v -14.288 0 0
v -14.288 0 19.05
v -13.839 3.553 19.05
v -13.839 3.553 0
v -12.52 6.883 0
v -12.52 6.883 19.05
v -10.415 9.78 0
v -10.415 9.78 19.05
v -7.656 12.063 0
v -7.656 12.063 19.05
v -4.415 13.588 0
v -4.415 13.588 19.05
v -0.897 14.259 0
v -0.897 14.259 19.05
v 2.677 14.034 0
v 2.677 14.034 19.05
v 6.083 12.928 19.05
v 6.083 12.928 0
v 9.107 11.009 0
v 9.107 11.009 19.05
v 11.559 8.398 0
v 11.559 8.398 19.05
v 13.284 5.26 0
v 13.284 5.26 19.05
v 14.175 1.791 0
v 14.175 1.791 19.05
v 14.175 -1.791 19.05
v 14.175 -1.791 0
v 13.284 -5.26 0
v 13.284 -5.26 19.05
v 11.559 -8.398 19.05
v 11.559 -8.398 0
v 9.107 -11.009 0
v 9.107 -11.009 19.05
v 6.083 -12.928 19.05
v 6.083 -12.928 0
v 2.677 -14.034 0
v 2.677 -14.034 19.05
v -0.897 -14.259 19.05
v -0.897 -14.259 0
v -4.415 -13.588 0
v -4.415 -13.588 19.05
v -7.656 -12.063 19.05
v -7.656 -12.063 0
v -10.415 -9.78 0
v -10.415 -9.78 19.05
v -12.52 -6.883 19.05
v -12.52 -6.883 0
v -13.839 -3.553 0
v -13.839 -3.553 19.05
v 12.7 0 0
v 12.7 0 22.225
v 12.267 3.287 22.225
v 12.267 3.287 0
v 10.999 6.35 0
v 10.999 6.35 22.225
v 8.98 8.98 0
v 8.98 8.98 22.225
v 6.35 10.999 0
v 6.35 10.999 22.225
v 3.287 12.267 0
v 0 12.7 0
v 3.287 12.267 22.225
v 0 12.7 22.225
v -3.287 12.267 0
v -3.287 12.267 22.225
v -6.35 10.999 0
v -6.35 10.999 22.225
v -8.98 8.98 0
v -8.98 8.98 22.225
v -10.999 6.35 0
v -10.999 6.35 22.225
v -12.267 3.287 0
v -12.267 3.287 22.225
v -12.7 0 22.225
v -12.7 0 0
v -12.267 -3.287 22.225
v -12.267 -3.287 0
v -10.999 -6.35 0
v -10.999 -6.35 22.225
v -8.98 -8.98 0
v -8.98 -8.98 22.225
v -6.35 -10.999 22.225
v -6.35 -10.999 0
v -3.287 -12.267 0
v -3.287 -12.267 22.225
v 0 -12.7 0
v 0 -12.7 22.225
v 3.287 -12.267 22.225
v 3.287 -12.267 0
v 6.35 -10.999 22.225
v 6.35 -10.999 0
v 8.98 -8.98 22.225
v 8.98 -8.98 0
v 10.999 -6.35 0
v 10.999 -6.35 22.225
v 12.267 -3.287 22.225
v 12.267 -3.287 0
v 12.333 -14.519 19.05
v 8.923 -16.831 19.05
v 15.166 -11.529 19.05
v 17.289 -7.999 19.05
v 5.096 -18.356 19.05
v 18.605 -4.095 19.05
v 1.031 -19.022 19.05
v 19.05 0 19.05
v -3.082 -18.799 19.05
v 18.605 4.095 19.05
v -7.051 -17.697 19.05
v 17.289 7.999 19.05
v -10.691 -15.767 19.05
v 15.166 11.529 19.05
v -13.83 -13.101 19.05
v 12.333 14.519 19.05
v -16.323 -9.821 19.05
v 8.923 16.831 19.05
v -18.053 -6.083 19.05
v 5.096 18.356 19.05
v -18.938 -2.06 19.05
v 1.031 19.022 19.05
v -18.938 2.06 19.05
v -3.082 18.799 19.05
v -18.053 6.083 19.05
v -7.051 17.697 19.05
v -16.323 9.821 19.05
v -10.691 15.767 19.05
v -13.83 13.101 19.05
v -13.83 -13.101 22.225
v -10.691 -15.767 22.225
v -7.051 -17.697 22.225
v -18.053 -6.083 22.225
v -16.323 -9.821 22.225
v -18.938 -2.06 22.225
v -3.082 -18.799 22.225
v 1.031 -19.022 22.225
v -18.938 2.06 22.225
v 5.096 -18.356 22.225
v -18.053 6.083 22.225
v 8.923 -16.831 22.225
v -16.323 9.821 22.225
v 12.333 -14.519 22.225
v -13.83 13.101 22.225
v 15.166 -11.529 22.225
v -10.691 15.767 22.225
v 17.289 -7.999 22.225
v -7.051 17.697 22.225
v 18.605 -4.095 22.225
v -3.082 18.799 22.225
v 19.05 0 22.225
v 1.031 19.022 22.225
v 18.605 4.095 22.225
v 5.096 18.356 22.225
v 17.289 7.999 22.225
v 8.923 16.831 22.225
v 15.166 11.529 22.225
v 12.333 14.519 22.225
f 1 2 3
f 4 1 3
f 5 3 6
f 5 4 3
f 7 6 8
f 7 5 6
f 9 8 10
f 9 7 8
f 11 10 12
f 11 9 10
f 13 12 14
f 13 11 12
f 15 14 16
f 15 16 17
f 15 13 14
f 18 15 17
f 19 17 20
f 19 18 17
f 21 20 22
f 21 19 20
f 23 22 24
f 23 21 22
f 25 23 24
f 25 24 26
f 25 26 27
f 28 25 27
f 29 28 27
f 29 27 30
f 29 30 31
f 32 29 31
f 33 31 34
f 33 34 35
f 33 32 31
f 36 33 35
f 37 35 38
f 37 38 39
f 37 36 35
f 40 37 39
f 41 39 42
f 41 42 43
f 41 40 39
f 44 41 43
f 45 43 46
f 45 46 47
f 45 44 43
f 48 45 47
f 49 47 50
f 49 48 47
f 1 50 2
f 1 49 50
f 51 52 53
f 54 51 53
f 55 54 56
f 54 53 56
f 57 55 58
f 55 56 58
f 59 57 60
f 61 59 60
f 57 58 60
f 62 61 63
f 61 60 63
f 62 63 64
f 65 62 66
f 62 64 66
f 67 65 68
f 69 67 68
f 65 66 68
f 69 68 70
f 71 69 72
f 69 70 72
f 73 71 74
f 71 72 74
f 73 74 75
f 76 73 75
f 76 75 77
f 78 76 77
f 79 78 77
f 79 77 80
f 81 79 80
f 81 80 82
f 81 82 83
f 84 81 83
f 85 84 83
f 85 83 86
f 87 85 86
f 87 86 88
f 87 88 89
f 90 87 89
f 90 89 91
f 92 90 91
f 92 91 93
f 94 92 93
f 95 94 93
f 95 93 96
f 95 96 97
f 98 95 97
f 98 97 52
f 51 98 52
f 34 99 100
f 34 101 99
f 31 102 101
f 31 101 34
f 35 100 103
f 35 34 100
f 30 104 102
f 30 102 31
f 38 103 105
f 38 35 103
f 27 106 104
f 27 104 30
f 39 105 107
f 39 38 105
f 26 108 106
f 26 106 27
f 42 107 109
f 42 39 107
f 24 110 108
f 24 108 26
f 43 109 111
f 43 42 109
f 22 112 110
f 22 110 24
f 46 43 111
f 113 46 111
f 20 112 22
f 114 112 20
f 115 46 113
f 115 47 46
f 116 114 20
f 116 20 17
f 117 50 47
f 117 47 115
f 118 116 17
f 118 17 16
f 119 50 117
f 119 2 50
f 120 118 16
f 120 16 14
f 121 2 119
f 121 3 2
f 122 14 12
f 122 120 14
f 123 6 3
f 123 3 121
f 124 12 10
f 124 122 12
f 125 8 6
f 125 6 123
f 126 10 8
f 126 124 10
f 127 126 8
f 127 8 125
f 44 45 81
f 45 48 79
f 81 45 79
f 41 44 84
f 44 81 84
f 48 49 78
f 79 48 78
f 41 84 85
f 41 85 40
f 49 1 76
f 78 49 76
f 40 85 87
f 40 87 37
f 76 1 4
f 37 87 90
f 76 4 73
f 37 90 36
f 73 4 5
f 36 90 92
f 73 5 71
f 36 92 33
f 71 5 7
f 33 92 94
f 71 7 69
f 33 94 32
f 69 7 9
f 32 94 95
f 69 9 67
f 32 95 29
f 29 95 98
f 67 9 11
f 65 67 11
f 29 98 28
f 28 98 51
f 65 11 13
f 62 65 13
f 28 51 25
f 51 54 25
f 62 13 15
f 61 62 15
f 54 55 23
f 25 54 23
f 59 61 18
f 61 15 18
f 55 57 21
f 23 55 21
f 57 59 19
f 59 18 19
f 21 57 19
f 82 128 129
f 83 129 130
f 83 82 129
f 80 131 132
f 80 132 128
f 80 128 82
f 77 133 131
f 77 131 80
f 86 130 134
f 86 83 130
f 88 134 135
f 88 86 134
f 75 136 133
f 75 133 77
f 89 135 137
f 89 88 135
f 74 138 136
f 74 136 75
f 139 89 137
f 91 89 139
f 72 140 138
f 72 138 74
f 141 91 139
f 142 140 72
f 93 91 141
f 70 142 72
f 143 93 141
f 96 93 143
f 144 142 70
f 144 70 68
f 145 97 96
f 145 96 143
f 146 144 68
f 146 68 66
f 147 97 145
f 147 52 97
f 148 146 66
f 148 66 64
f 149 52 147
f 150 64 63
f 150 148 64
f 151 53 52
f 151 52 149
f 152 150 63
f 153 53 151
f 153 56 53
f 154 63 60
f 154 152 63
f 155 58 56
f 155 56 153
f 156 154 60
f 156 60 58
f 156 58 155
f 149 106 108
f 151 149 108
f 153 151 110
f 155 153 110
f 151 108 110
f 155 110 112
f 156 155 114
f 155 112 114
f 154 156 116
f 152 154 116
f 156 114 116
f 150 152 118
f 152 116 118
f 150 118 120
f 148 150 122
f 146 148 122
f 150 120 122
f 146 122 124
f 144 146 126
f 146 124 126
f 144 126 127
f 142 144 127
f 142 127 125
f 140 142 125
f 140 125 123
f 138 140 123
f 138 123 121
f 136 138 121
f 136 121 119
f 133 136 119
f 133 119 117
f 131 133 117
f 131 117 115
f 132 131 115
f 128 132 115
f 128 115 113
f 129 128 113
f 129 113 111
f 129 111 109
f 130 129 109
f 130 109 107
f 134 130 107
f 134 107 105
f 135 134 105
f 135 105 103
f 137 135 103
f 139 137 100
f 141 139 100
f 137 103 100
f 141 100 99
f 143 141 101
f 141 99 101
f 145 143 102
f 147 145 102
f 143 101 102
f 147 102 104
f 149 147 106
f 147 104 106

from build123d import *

# Parameters (mm, degrees)
SKETCH1_R           = 19.05
BOSS_EXTRUDE1_DEPTH = 22.225
SKETCH2_R           = 19.05
SKETCH2_R_2         = 14.2875
CUT_EXTRUDE1_DEPTH  = 19.05
SKETCH3_R           = 12.7
CUT_EXTRUDE2_DEPTH  = 35.925


with BuildPart() as part:
    # Sketch1 → Boss-Extrude1 (new body)
    with BuildSketch(Plane.XY):
        Circle(SKETCH1_R)
    extrude(amount=BOSS_EXTRUDE1_DEPTH)

    # Sketch2 → Cut-Extrude1 (cut)
    with BuildSketch(Plane(origin=(0, 0, 0), x_dir=(-1, 0, 0), z_dir=(0, 0, -1))):
        Circle(SKETCH2_R)
        Circle(SKETCH2_R_2, mode=Mode.SUBTRACT)
    extrude(amount=-CUT_EXTRUDE1_DEPTH, mode=Mode.SUBTRACT)

    # Sketch3 → Cut-Extrude2 (cut, through all)
    with BuildSketch(Plane.XY.offset(22.225)):
        Circle(SKETCH3_R)
    extrude(amount=-CUT_EXTRUDE2_DEPTH, mode=Mode.SUBTRACT)


solid = part.part
